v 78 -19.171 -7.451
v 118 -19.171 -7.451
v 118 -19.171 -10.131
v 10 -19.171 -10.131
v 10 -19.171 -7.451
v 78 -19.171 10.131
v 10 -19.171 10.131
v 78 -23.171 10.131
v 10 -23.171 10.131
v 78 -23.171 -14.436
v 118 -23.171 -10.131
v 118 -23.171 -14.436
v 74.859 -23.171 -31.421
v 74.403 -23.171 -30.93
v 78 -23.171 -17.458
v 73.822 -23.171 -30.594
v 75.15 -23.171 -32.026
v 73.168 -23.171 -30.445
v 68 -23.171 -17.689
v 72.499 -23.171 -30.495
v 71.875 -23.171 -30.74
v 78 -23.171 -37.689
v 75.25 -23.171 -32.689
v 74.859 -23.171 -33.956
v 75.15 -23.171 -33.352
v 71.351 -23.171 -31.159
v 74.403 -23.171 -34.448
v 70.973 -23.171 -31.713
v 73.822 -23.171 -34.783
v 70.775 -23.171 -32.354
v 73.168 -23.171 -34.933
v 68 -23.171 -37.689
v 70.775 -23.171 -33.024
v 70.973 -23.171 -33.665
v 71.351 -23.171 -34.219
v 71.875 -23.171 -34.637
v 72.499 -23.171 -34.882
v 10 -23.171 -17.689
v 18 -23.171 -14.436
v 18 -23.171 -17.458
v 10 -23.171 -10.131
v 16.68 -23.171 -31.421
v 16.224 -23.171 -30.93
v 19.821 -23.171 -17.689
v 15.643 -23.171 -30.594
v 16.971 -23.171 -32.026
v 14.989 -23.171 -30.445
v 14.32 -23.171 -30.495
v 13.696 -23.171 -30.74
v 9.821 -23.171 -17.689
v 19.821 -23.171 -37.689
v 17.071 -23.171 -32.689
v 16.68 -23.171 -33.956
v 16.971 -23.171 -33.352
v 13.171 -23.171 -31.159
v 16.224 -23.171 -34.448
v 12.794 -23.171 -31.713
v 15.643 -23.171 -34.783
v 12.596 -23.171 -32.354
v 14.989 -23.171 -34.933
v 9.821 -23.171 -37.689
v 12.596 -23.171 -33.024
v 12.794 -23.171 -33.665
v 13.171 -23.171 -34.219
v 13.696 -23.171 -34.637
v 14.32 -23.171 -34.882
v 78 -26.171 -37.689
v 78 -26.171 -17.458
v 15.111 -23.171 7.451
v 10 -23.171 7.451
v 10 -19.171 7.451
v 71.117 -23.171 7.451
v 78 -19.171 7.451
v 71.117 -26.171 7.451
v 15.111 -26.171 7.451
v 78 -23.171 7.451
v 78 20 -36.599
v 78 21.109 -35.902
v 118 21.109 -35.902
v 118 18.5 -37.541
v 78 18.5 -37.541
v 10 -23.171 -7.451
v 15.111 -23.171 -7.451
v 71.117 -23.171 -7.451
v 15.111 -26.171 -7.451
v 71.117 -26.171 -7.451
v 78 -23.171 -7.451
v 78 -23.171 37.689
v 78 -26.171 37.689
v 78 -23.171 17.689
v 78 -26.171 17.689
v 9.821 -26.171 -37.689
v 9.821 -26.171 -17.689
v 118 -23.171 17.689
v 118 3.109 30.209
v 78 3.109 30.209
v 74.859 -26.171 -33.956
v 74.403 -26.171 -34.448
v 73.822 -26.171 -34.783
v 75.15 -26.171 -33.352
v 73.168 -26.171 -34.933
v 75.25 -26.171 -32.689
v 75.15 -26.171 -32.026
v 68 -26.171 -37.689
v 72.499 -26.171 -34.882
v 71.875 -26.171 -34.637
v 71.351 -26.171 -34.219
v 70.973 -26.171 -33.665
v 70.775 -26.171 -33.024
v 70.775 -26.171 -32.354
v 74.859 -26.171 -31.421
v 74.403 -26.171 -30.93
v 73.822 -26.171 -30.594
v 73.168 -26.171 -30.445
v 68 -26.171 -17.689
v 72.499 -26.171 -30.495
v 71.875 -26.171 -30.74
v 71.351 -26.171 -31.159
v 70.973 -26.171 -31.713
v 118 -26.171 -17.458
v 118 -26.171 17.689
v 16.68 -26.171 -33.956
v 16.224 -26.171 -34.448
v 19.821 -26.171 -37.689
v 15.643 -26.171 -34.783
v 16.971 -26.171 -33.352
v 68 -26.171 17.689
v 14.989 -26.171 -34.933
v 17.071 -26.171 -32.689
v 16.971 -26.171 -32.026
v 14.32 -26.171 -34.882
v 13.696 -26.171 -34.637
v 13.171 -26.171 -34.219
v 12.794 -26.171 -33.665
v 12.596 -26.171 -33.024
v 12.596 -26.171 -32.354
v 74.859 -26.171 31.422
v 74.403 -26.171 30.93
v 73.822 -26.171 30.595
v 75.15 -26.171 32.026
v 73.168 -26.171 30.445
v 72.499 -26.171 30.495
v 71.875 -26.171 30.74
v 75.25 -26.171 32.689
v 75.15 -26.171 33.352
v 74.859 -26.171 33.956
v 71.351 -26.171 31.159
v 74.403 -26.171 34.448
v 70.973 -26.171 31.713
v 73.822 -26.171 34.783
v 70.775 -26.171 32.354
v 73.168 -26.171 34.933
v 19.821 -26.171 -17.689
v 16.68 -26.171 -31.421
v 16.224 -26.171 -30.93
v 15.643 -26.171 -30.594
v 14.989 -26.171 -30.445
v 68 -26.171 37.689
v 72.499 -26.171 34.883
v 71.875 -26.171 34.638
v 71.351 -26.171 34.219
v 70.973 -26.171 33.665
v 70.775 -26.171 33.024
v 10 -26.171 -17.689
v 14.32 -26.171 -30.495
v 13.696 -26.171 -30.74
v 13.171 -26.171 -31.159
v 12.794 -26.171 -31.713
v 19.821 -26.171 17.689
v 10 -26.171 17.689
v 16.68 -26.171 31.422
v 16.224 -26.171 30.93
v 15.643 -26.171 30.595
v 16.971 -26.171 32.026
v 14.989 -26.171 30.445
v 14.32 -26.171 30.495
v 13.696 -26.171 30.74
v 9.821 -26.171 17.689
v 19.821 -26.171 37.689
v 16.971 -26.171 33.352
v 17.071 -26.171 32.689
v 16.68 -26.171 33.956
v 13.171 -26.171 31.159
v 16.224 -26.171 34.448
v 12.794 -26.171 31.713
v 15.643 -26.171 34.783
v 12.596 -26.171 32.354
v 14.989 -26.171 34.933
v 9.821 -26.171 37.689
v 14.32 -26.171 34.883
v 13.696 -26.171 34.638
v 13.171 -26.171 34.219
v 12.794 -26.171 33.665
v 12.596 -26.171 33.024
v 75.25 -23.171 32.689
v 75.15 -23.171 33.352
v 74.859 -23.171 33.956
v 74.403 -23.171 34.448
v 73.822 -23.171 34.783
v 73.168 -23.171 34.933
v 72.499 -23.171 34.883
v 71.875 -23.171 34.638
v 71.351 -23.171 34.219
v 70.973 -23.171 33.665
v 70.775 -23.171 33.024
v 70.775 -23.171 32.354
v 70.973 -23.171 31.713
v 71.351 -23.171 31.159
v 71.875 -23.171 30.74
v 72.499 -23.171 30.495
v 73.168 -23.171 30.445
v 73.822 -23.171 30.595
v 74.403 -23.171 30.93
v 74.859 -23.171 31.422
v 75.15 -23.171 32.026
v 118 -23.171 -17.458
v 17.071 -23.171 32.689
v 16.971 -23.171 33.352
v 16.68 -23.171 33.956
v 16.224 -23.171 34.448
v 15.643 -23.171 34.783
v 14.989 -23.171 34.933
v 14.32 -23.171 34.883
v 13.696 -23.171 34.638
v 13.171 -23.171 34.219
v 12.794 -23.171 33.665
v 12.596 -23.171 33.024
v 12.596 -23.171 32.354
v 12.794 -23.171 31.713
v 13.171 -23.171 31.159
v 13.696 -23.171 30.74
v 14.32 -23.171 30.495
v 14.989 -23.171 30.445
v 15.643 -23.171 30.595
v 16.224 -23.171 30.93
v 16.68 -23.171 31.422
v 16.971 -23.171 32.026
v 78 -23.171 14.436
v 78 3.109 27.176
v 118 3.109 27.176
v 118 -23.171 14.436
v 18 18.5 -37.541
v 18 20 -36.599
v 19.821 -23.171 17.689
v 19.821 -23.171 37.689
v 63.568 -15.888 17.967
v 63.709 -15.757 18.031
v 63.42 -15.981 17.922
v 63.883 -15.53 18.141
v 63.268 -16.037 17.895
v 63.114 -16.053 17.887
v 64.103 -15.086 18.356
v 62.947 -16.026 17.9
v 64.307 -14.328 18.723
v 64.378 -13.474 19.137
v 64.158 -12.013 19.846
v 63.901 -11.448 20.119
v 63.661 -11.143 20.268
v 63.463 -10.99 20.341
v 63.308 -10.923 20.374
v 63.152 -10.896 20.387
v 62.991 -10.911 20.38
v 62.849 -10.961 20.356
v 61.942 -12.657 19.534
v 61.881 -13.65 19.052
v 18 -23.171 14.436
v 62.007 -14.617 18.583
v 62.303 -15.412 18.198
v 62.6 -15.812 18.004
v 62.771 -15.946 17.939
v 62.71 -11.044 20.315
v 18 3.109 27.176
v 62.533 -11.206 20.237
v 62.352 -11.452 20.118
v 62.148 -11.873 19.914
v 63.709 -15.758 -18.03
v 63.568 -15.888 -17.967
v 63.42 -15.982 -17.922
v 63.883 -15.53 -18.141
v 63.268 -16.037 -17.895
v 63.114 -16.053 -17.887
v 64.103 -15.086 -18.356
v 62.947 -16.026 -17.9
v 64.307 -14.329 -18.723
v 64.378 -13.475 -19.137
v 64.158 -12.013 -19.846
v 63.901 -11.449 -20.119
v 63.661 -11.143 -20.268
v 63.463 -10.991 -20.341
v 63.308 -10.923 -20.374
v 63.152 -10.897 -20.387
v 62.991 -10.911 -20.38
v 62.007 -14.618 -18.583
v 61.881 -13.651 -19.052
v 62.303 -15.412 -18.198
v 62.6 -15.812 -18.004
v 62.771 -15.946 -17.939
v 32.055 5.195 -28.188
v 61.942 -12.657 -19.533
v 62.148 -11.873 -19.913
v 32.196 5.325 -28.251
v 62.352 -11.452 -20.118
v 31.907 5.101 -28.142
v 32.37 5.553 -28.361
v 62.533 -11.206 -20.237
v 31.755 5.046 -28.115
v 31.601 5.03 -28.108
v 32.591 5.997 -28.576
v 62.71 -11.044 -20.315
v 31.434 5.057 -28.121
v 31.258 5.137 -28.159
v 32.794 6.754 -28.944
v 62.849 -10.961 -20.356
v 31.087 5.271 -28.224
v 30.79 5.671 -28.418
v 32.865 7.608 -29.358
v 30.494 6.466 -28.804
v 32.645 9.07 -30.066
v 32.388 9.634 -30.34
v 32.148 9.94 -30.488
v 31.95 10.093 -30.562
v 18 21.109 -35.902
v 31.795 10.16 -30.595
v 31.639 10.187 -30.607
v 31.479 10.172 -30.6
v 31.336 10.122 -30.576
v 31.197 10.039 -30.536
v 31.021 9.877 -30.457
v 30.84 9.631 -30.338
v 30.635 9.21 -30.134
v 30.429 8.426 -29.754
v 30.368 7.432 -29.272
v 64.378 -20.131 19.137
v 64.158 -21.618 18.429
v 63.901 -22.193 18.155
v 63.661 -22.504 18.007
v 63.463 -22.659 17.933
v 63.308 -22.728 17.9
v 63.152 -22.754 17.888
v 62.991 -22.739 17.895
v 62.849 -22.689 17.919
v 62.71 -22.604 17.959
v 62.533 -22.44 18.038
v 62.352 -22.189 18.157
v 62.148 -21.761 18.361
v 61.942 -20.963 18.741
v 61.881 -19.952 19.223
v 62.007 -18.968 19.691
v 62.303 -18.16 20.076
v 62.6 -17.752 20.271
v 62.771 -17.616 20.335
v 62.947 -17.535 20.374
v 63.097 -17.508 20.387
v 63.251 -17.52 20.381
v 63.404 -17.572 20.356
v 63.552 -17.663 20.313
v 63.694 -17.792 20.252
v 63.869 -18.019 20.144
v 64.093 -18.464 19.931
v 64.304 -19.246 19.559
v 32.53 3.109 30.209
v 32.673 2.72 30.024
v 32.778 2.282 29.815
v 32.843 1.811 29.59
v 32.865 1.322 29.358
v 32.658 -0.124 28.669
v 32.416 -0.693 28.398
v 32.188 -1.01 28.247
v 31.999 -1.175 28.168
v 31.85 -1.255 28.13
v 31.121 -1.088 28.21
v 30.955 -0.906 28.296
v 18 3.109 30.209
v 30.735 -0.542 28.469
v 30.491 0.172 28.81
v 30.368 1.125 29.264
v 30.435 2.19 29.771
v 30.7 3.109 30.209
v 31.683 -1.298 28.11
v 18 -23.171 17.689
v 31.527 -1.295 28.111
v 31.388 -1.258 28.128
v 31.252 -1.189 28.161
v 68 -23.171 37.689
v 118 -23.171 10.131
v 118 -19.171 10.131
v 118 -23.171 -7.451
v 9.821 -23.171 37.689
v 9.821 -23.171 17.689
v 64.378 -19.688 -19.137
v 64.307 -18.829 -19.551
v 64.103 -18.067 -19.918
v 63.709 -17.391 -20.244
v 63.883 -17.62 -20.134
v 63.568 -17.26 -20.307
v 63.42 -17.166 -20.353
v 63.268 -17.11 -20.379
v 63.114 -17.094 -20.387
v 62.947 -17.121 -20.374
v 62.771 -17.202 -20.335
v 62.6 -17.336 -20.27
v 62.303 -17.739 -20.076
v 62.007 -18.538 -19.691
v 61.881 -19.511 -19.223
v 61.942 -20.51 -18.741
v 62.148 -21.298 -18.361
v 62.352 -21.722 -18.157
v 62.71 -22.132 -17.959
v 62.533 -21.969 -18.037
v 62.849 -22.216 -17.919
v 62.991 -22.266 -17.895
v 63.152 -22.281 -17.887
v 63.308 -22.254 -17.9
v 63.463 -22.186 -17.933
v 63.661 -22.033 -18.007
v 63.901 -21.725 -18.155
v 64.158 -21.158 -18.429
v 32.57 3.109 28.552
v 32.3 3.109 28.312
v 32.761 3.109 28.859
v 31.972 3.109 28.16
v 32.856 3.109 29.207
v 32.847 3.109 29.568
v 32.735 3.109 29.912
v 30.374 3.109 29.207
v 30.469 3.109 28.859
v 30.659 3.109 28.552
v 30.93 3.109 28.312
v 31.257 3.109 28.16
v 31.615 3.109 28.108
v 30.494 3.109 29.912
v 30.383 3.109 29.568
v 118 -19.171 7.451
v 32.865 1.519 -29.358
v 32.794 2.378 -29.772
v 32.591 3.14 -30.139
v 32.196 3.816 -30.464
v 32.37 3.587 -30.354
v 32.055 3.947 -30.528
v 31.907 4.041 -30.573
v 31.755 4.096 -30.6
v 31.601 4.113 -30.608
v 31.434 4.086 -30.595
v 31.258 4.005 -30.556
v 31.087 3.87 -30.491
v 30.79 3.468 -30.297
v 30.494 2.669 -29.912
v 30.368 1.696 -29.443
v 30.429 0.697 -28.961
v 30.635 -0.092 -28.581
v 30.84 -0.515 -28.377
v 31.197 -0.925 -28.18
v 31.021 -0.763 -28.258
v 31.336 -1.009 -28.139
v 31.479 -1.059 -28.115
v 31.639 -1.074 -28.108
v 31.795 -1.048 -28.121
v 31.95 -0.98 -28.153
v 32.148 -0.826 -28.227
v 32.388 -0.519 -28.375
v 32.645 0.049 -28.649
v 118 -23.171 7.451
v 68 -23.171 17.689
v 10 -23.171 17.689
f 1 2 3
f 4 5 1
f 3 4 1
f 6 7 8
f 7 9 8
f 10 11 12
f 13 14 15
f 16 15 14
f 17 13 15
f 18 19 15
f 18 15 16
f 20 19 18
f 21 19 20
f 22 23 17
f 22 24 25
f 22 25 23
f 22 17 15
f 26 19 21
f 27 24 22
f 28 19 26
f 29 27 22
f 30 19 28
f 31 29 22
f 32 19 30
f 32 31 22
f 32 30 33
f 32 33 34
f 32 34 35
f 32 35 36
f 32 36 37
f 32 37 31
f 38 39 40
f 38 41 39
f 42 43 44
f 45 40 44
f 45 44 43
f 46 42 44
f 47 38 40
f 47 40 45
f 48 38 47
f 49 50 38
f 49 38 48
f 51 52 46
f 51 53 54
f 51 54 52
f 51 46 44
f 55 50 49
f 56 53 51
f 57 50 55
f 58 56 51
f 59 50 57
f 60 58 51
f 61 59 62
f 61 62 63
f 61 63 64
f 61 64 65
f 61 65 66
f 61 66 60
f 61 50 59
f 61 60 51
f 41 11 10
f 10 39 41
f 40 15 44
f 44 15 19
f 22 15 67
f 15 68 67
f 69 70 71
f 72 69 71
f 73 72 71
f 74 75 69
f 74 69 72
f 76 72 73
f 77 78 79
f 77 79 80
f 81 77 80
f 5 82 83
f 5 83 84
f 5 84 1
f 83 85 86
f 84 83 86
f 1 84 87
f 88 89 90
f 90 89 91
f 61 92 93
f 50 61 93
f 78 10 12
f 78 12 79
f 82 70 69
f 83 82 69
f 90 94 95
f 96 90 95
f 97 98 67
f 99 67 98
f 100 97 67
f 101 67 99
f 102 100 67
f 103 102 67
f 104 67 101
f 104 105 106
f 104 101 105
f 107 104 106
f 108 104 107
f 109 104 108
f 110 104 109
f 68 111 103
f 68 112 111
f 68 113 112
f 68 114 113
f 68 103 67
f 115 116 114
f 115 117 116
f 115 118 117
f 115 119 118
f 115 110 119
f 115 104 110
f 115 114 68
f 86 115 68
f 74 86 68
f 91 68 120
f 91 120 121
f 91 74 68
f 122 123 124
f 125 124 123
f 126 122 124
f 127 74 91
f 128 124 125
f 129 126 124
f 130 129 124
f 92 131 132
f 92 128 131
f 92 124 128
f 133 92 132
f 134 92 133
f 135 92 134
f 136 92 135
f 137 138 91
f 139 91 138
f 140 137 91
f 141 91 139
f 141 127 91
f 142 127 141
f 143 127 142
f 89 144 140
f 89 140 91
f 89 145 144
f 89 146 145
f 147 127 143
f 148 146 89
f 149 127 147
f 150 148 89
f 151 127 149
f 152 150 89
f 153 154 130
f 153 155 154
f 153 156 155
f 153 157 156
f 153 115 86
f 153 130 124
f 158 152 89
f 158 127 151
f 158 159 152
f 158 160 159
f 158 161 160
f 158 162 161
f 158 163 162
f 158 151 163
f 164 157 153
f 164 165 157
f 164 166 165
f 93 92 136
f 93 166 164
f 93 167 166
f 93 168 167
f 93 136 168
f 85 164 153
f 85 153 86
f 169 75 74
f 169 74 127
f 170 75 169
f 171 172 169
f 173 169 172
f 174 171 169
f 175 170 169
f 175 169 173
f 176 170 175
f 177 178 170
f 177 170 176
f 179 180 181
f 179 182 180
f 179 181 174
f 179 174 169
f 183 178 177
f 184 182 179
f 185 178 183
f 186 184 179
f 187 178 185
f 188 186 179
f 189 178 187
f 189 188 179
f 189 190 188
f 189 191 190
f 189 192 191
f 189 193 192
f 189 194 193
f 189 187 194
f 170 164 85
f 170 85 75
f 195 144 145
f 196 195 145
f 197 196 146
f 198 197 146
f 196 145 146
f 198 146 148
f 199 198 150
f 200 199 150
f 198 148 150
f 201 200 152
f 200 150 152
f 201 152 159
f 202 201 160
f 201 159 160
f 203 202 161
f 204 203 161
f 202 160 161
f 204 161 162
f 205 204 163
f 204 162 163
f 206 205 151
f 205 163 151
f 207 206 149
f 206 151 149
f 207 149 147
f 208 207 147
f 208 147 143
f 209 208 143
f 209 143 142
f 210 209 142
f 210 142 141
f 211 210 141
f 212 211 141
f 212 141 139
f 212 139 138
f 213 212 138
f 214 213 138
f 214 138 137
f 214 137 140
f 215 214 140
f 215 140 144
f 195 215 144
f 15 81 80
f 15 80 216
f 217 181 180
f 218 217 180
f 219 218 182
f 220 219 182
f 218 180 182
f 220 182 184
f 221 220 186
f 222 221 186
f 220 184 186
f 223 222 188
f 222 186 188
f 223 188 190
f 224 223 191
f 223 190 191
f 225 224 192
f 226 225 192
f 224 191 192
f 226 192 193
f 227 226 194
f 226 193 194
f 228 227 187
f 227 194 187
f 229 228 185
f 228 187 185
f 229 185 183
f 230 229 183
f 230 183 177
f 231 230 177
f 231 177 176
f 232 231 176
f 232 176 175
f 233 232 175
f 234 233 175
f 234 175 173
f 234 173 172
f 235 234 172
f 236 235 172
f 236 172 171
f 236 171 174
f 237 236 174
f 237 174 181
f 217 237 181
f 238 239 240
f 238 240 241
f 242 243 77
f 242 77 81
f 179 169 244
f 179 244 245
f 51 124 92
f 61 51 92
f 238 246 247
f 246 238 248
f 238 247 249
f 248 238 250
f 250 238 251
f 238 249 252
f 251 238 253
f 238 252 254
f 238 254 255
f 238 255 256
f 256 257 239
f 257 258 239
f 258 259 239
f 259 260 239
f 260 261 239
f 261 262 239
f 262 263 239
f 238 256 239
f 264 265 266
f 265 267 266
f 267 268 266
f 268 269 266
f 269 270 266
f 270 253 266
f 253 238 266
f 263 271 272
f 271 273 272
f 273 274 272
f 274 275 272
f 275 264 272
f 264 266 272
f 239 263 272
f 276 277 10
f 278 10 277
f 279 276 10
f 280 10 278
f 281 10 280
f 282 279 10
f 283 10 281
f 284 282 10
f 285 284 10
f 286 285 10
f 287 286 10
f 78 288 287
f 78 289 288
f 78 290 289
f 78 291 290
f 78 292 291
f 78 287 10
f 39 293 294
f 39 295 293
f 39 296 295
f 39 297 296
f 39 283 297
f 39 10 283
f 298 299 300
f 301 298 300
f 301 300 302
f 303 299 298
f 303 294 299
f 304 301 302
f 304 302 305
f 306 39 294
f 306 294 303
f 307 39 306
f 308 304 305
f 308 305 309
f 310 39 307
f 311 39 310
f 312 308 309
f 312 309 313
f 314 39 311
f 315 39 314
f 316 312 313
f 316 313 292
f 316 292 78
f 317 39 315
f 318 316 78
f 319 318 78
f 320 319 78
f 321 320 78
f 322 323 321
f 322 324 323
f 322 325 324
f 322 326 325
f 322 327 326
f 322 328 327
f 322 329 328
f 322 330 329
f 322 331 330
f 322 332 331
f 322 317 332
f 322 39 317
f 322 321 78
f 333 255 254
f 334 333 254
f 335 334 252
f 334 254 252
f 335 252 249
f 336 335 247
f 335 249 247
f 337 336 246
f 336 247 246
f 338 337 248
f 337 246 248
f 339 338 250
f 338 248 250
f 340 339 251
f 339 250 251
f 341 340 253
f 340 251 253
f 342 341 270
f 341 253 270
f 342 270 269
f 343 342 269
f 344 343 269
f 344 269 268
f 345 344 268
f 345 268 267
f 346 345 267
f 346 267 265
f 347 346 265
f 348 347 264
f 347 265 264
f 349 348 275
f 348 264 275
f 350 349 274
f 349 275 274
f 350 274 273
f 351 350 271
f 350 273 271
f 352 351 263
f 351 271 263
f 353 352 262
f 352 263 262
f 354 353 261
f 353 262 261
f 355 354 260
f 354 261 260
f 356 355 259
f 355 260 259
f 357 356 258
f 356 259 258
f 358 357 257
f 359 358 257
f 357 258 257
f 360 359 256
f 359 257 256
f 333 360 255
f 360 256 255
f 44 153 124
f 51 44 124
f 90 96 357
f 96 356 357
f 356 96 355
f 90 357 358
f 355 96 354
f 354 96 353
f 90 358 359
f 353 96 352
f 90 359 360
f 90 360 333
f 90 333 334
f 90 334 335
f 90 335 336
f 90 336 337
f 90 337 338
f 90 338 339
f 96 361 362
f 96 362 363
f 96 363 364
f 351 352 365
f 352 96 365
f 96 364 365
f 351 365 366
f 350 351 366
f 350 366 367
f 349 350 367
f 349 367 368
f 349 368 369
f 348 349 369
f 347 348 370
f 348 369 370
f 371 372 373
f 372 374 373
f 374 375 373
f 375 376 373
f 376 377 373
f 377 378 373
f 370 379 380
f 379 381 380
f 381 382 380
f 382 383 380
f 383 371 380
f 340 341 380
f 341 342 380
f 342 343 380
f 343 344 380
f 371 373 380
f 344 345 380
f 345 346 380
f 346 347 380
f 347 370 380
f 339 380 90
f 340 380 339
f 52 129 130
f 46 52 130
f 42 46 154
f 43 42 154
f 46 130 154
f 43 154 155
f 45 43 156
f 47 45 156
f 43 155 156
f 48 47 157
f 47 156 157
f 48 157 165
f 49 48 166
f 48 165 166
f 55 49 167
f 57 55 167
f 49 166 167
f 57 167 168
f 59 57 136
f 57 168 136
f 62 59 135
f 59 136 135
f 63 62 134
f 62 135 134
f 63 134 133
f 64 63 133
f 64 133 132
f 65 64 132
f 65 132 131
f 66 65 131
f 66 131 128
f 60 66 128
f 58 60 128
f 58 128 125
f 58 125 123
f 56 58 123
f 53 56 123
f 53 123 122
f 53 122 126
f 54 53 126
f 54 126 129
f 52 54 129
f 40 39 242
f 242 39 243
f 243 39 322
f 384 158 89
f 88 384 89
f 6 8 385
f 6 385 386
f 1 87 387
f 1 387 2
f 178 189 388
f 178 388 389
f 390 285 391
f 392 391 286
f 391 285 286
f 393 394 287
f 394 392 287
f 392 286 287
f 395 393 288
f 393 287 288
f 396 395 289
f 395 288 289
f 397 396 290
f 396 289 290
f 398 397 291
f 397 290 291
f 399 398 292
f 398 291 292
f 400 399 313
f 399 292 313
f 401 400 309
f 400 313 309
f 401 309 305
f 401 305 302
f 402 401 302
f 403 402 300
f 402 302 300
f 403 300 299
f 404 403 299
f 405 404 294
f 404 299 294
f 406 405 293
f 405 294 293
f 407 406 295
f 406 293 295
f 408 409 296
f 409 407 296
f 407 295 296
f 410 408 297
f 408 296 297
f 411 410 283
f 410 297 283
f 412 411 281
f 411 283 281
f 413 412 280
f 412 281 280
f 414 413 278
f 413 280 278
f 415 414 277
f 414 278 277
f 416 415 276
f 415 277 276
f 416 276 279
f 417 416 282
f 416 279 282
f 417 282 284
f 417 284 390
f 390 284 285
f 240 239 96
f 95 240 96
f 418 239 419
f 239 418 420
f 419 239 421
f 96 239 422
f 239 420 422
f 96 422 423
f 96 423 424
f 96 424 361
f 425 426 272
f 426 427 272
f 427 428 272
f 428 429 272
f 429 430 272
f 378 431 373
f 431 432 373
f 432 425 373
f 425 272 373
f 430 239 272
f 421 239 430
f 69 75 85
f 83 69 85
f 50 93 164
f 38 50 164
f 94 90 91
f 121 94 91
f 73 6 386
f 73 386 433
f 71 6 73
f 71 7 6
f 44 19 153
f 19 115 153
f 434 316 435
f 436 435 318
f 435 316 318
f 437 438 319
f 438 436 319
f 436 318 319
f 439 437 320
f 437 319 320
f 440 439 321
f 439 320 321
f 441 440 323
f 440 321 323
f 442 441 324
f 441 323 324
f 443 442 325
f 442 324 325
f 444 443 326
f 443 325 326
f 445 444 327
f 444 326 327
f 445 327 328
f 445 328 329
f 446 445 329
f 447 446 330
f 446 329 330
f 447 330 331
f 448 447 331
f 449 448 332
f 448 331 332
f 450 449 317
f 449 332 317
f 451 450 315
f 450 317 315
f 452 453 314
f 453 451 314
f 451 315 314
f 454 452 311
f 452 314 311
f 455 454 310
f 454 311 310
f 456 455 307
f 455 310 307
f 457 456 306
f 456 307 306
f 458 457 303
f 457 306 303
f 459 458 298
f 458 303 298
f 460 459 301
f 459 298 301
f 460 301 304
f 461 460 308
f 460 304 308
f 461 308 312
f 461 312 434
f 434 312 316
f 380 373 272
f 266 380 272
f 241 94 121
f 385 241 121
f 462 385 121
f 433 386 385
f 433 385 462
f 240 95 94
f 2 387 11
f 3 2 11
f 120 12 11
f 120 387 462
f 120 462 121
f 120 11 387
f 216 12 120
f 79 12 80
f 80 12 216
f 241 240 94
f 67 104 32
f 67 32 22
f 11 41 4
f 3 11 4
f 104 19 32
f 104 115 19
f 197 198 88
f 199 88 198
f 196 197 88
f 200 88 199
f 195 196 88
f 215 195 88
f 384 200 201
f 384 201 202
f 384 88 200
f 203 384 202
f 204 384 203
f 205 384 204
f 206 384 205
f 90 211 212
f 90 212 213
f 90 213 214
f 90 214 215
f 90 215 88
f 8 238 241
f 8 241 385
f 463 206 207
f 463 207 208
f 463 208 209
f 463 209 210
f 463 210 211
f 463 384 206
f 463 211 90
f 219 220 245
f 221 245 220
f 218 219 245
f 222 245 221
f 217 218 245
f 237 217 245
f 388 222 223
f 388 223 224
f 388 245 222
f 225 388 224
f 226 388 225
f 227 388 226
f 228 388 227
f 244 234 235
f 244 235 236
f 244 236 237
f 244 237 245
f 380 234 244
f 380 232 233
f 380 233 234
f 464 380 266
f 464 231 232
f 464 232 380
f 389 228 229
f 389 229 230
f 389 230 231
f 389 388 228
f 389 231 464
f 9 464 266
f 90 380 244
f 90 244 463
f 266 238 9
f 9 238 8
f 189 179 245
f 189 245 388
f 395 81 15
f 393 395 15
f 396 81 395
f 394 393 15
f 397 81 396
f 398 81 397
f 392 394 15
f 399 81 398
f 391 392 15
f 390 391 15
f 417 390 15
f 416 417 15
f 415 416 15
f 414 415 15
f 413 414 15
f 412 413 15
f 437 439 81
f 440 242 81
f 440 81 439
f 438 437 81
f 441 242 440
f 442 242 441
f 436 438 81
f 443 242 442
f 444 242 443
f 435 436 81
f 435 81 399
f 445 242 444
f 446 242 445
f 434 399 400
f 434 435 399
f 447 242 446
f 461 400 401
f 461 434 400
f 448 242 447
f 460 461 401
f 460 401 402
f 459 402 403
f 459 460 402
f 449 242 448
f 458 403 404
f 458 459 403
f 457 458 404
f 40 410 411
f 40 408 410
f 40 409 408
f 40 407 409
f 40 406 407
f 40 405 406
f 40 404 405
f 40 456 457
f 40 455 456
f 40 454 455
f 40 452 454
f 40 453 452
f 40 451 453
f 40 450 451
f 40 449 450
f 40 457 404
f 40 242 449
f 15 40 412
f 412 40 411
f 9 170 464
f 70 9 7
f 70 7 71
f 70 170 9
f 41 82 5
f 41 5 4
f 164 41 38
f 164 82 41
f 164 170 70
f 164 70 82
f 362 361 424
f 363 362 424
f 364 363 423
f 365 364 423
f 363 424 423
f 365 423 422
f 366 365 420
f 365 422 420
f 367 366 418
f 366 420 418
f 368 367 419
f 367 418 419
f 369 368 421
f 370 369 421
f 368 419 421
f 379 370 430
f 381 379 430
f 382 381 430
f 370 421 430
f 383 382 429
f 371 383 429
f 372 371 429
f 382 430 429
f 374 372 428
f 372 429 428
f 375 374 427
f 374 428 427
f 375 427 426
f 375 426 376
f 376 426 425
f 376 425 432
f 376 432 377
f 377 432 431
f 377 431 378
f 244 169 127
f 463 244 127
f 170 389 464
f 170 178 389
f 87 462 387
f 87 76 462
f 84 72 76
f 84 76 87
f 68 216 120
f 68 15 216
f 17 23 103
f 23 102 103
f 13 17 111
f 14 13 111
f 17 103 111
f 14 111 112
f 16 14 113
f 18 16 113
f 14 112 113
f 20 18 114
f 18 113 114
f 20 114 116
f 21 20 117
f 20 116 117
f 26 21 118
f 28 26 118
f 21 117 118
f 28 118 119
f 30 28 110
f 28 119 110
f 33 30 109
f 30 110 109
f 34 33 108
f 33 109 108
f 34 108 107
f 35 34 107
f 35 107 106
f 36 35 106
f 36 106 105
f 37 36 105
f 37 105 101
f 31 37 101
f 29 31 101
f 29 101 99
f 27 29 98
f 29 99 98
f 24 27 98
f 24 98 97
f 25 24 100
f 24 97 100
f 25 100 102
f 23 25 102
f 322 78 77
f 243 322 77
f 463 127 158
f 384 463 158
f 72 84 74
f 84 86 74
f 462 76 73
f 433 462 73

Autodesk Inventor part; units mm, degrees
ref_plane "YZ Plane" through (0, 0, 0) normal (1, 0, 0) x (0, 1, 0)
ref_plane "XZ Plane" through (0, 0, 0) normal (0, 1, 0) x (-1, 0, 0)
ref_plane "XY Plane" through (0, 0, 0) normal (0, 0, 1) x (1, 0, 0)
ref_plane "Plan de construction16" through (10, -26.1714, -17.6889) normal (0, -1, 0) x (1, 0, 0)
sketch "Esquisse9" plane through (10, -26.1714, -17.6889) normal (0, -1, 0) x (1, 0, 0)
  line L0 (0, 35.3779) -> (8, 35.3779) projected
  line L1 (68, 1.8848) -> (68, 33.493) projected
  line L2 (0, 35.3779) -> (68, 35.3779)
  line L3 (68, 35.3779) -> (68, 32.0585)
  line L4 (0, 32.0585) -> (0, 35.3779)
  line L5 (0, 0) -> (8, 0) projected
  line L6 (0, 37.6889) -> (0, -2.3111) projected
  line L7 (68, 0) -> (0, 0)
  line L8 (0, 0) -> (0, 3.3237)
  line L9 (68, 3.3237) -> (68, 0)
  line L10 (68, 35.3779) -> (0, 35.3779)
  line L11 (0, 35.3779) -> (0, 0)
  line L12 (0, 0) -> (68, 0)
  line L13 (68, 0) -> (68, 35.3779)
  point P0 (-10, 17.6889)
  point P1 (67.75, 35.3779)
  point P2 (67.75, 0)
extrude "Extrusion11" add sketch "Esquisse9" against normal blind 3
ref_plane "Plan de construction18" through (78, -26.1714, -17.6889) normal (0, -1, 0) x (1, 0, 0)
sketch "Esquisse13" plane through (78, -26.1714, -17.6889) normal (0, -1, 0) x (1, 0, 0)
  line L0 (-65, 35.3779) -> (-60, 35.3779) projected
  line L1 (0, 35.3779) -> (-10, 35.3779)
  line L2 (-10, 35.3779) -> (-10, 55.3779)
  line L3 (-10, 55.3779) -> (0, 55.3779)
  line L4 (0, 55.3779) -> (0, 35.3779)
  line L5 (0, 35.3779) -> (0, 0) construction
  line L6 (0, 17.6889) -> (-68.1792, 17.6889) construction
  line L7 (-68.1792, 35.3779) -> (-58.1792, 35.3779)
  line L8 (-58.1792, 35.3779) -> (-58.1792, 55.3779)
  line L9 (-58.1792, 55.3779) -> (-68.1792, 55.3779)
  line L10 (-68.1792, 55.3779) -> (-68.1792, 35.3779)
  line L11 (-65, 0) -> (0, 0)
  line L12 (0, 0) -> (-10, 0)
  line L13 (-10, 0) -> (-10, -20)
  line L14 (-10, -20) -> (0, -20)
  line L15 (0, -20) -> (0, 0)
  line L16 (-68.1792, 0) -> (-58.1792, 0)
  line L17 (-58.1792, 0) -> (-58.1792, -20)
  line L18 (-58.1792, -20) -> (-68.1792, -20)
  line L19 (-68.1792, -20) -> (-68.1792, 0)
  line L20 (-5, 34.0863) -> (-5, 43.2092) construction
  circle A0 centre (-5, 50.3779) radius 2.25
  circle A1 centre (-63.1792, 50.3779) radius 2.25
  circle A2 centre (-63.1792, -15) radius 2.25
  line L21 (-5, -1.4113) -> (-5, -11.1612) projected
  circle A3 centre (-5, -15) radius 2.25
  point P0 (-78, 17.6889)
  point P1 (0, 1.8848)
  point P2 (0, 33.493)
  point P3 (-0.25, 35.3779)
  dimension "d45" = 10
  dimension "d46" = 20
  dimension "d47" = 10
  dimension "d48" = 20
  dimension "d49" = 4.5
  dimension "d50" = 4.5
  dimension "d51" = 4.5
  dimension "d52" = 4.5
  dimension "d57" = 0
  dimension "d58" = 5
  dimension "d59" = 5
  dimension "d60" = 5
  dimension "d61" = 5
extrude "Extrusion12" add sketch "Esquisse13" against normal blind 3
ref_plane "Plan de construction19" through (18, 0, 0) normal (1, 0, 0) x (0, 0, -1)
sketch "Esquisse14" plane through (18, 0, 0) normal (1, 0, 0) x (0, 0, -1)
  line L0 (-19.134, -23.1714) -> (-15.8041, -23.1714)
  line L1 (-19.134, -23.1714) -> (-15.8041, -23.1714) projected
  line L2 (-15.8041, -23.1714) -> (-36.599, 20) projected
  line L3 (-38.4838, 17) -> (-19.134, -23.1714) projected
  line L4 (-19.134, -23.1714) -> (-15.8041, -23.1714) projected
  line L5 (-19.134, -23.1714) -> (-15.8041, -23.1714) projected
  line L6 (-36.599, 20) -> (-38.4838, 17) projected
  line L7 (-15.8041, -23.1714) -> (-36.599, 20) projected
  line L8 (-36.599, 20) -> (-38.4838, 17) projected
  line L9 (-38.4838, 17) -> (-19.134, -23.1714) projected
  line L10 (-15.8041, -23.1714) -> (-36.599, 20) projected
  line L11 (-36.599, 20) -> (-38.4838, 17) projected
  line L12 (-38.4838, 17) -> (-19.134, -23.1714) projected
  line L13 (17.6889, -23.1714) -> (-17.6889, -23.1714) projected
  line L14 (-14.4365, -23.1714) -> (-35.9022, 21.1089)
  line L15 (-35.9022, 21.1089) -> (-36.599, 20)
  line L16 (0, 22.9524) -> (0, -23.1714) construction
  line L17 (15.8041, -23.1714) -> (36.599, 20)
  line L18 (-17.6889, -23.1714) -> (17.6889, -23.1714)
  line L19 (14.4365, -23.1714) -> (35.9022, 21.1089)
  line L20 (35.9022, 21.1089) -> (36.599, 20)
  line L21 (14.4365, -23.1714) -> (15.8041, -23.1714)
  line L22 (35.9022, 21.1089) -> (36.599, 20)
  line L23 (15.8041, -23.1714) -> (36.599, 20)
  line L24 (35.9022, 21.1089) -> (14.4365, -23.1714)
  line L25 (-36.599, 20) -> (-37.5414, 18.5)
  line L26 (-17.6889, -23.1714) -> (-17.6889, -26.1714) projected
  line L27 (-37.5414, 18.5) -> (-17.6889, -23.1714)
  line L28 (-17.6889, -23.1714) -> (-14.4365, -23.1714)
  line L29 (35.9022, 21.1089) -> (37.5414, 18.5)
  line L30 (37.5414, 18.5) -> (17.4582, -23.1714)
  line L31 (14.4365, -23.1714) -> (17.4582, -23.1714)
  point P0 (0, 0)
ref_plane "Plan de construction10" through (78, -23.1714, 15.8041) normal (0, 1, 0) x (1, 0, 0)
sketch "Esquisse15" plane through (78, -23.1714, 15.8041) normal (0, 1, 0) x (1, 0, 0)
  line L0 (0, 53.493) -> (0, -21.8848) projected
  line L1 (-68, 5.6727) -> (0, 5.6727)
  line L2 (0, 5.6727) -> (0, 8.3531)
  line L3 (0, 8.3531) -> (-68, 8.3531)
  line L4 (-68, 8.3531) -> (-68, 5.6727)
  line L5 (-68, 33.493) -> (-68, -1.8848) projected
  line L6 (-68, -1.8848) -> (-68, 33.493) construction
  line L7 (-68, 15.8041) -> (0, 15.8041) construction
  line L8 (0, 53.493) -> (0, -21.8848)
  line L9 (-68, 25.9355) -> (0, 25.9355)
  line L10 (0, 25.9355) -> (0, 23.255)
  line L11 (0, 23.255) -> (-68, 23.255)
  line L12 (-68, 23.255) -> (-68, 25.9355)
  line L13 (-68, -1.8848) -> (-68, 33.493)
  line L14 (-68, 33.493) -> (-68, -1.8848) construction
  point P0 (-78, 15.8041)
extrude "Extrusion14" add sketch "Esquisse15" along normal blind 4 contours L0 L11 L5 L9 | L0 L1 L4 L3
ref_plane "Plan de construction11" through (68, -26.1714, -37.6889) normal (0, -1, 0) x (1, 0, 0)
sketch "Esquisse16" plane through (68, -26.1714, -37.6889) normal (0, -1, 0) x (1, 0, 0)
  line L0 (-58, 45.1399) -> (10, 45.1399) projected
  line L1 (-58, 30.238) -> (10, 30.238) projected
  line L2 (3.117, 45.1399) -> (-52.8886, 45.1399)
  line L3 (-52.8886, 45.1399) -> (-52.8886, 30.238)
  line L4 (-52.8886, 30.238) -> (3.117, 30.238)
  line L5 (3.117, 30.238) -> (3.117, 45.1399)
  point P0 (-68, 37.6889)
extrude "Extrusion15" cut sketch "Esquisse16" against normal blind 4
extrude "Extrusion16" add sketch "Esquisse14" along normal up to surface (60 mm away) contours L19 L20 L17 L13 | L27 L6 L2 L0 | L2 L15 L14 L13 | L17 L29 L30 L13
ref_plane "Plan de construction20" through (18, 21.1089, -35.9022) normal (0, -1, 0) x (1, 0, 0)
sketch "Esquisse17" plane through (18, 21.1089, -35.9022) normal (0, -1, 0) x (1, 0, 0)
  circle A0 centre (18.615, 35.9022) radius 22.5 construction
  circle A1 centre (45.1277, 16.765) radius 1.25
  line L0 (50, 53.5912) -> (50, 73.5912) projected
  circle A2 centre (13.6149, 6.5446) radius 1.25
  line L1 (60, 43.3532) -> (60, 28.4513) projected
  line L2 (-11.4468, 35.9022) -> (31.8074, 35.9022) construction
  circle A3 centre (45.1277, 55.0395) radius 1.25
  line L3 (13.6149, 53.5912) -> (50, -1.7867)
  circle A4 centre (13.6149, 65.2599) radius 1.25
  point P0 (-18, 35.9022)
  dimension "d68" = 45
  dimension "d69" = 2.5
  dimension "d70" = 2.5
  dimension "d71" = 41.385
extrude "Extrusion17" cut sketch "Esquisse17" along normal up to surface (44.2803 mm away)
sketch "Esquisse18" plane through (18, 21.1089, -35.9022) normal (0, -1, 0) x (1, 0, 0)
  line L0 (-5.0895, 79.4289) -> (61.3071, 79.4289)
  line L1 (61.3071, 79.4289) -> (61.3071, 14.8125)
  line L2 (61.3071, 14.8125) -> (-5.0895, 14.8125)
  line L3 (-5.0895, 14.8125) -> (-5.0895, 79.4289)
  point P0 (-18, 35.9022)
extrude "Extrusion18" cut sketch "Esquisse18" along normal blind 18
sketch "Esquisse19" plane through (78, -26.1714, 37.6889) normal (1, 0, 0) x (0, 0, -1)
  line L0 (10.5125, 29.2803) -> (7.4799, 29.2803) projected
  line L1 (20, 3) -> (7.4799, 29.2803) projected
  line L2 (0, 3) -> (20, 3) projected
  line L3 (0, 0) -> (0, 3) projected
  line L4 (75.3779, 0) -> (0, 0) projected
  line L5 (75.3779, 0) -> (75.3779, 3) projected
  line L6 (55.1472, 3) -> (75.3779, 3) projected
  line L7 (75.2303, 44.6714) -> (55.1472, 3) projected
  line L8 (73.5912, 47.2803) -> (75.2303, 44.6714) projected
  line L9 (52.1254, 3) -> (73.5912, 47.2803) projected
  line L10 (47.8203, 3) -> (52.1254, 3) projected
  line L11 (47.8203, 3) -> (47.8203, 7) projected
  line L12 (45.1399, 7) -> (47.8203, 7) projected
  line L13 (45.1399, 3) -> (45.1399, 7) projected
  line L14 (30.238, 3) -> (45.1399, 3) projected
  line L15 (30.238, 3) -> (30.238, 7) projected
  line L16 (27.5576, 7) -> (30.238, 7) projected
  line L17 (27.5576, 3) -> (27.5576, 7) projected
  line L18 (23.2524, 3) -> (27.5576, 3) projected
  line L19 (10.5125, 29.2803) -> (23.2524, 3) projected
  line L20 (0, 3) -> (20, 3) projected
  line L21 (20, 3) -> (20, 0) projected
  line L22 (20, 0) -> (55.3779, 0) projected
  line L23 (55.1472, 3) -> (75.2303, 44.6714) projected
  line L24 (47.8203, 0) -> (50.6711, 0)
  line L25 (20, 3) -> (20, 0)
  line L26 (20, 0) -> (55.1472, 0)
  line L27 (55.1472, 3) -> (55.1472, 0)
  line L28 (55.1472, 3) -> (75.2303, 44.6714)
  point P0 (37.6889, 26.1714)
extrude "Extrusion19" add sketch "Esquisse19" along normal blind 40 contours L19 L18 L17 L16 L15 L14 L13 L12 L11 L10 L9 L8 L7 L27 L4 L21 L1 L0
properties part number "new_cuiller"
